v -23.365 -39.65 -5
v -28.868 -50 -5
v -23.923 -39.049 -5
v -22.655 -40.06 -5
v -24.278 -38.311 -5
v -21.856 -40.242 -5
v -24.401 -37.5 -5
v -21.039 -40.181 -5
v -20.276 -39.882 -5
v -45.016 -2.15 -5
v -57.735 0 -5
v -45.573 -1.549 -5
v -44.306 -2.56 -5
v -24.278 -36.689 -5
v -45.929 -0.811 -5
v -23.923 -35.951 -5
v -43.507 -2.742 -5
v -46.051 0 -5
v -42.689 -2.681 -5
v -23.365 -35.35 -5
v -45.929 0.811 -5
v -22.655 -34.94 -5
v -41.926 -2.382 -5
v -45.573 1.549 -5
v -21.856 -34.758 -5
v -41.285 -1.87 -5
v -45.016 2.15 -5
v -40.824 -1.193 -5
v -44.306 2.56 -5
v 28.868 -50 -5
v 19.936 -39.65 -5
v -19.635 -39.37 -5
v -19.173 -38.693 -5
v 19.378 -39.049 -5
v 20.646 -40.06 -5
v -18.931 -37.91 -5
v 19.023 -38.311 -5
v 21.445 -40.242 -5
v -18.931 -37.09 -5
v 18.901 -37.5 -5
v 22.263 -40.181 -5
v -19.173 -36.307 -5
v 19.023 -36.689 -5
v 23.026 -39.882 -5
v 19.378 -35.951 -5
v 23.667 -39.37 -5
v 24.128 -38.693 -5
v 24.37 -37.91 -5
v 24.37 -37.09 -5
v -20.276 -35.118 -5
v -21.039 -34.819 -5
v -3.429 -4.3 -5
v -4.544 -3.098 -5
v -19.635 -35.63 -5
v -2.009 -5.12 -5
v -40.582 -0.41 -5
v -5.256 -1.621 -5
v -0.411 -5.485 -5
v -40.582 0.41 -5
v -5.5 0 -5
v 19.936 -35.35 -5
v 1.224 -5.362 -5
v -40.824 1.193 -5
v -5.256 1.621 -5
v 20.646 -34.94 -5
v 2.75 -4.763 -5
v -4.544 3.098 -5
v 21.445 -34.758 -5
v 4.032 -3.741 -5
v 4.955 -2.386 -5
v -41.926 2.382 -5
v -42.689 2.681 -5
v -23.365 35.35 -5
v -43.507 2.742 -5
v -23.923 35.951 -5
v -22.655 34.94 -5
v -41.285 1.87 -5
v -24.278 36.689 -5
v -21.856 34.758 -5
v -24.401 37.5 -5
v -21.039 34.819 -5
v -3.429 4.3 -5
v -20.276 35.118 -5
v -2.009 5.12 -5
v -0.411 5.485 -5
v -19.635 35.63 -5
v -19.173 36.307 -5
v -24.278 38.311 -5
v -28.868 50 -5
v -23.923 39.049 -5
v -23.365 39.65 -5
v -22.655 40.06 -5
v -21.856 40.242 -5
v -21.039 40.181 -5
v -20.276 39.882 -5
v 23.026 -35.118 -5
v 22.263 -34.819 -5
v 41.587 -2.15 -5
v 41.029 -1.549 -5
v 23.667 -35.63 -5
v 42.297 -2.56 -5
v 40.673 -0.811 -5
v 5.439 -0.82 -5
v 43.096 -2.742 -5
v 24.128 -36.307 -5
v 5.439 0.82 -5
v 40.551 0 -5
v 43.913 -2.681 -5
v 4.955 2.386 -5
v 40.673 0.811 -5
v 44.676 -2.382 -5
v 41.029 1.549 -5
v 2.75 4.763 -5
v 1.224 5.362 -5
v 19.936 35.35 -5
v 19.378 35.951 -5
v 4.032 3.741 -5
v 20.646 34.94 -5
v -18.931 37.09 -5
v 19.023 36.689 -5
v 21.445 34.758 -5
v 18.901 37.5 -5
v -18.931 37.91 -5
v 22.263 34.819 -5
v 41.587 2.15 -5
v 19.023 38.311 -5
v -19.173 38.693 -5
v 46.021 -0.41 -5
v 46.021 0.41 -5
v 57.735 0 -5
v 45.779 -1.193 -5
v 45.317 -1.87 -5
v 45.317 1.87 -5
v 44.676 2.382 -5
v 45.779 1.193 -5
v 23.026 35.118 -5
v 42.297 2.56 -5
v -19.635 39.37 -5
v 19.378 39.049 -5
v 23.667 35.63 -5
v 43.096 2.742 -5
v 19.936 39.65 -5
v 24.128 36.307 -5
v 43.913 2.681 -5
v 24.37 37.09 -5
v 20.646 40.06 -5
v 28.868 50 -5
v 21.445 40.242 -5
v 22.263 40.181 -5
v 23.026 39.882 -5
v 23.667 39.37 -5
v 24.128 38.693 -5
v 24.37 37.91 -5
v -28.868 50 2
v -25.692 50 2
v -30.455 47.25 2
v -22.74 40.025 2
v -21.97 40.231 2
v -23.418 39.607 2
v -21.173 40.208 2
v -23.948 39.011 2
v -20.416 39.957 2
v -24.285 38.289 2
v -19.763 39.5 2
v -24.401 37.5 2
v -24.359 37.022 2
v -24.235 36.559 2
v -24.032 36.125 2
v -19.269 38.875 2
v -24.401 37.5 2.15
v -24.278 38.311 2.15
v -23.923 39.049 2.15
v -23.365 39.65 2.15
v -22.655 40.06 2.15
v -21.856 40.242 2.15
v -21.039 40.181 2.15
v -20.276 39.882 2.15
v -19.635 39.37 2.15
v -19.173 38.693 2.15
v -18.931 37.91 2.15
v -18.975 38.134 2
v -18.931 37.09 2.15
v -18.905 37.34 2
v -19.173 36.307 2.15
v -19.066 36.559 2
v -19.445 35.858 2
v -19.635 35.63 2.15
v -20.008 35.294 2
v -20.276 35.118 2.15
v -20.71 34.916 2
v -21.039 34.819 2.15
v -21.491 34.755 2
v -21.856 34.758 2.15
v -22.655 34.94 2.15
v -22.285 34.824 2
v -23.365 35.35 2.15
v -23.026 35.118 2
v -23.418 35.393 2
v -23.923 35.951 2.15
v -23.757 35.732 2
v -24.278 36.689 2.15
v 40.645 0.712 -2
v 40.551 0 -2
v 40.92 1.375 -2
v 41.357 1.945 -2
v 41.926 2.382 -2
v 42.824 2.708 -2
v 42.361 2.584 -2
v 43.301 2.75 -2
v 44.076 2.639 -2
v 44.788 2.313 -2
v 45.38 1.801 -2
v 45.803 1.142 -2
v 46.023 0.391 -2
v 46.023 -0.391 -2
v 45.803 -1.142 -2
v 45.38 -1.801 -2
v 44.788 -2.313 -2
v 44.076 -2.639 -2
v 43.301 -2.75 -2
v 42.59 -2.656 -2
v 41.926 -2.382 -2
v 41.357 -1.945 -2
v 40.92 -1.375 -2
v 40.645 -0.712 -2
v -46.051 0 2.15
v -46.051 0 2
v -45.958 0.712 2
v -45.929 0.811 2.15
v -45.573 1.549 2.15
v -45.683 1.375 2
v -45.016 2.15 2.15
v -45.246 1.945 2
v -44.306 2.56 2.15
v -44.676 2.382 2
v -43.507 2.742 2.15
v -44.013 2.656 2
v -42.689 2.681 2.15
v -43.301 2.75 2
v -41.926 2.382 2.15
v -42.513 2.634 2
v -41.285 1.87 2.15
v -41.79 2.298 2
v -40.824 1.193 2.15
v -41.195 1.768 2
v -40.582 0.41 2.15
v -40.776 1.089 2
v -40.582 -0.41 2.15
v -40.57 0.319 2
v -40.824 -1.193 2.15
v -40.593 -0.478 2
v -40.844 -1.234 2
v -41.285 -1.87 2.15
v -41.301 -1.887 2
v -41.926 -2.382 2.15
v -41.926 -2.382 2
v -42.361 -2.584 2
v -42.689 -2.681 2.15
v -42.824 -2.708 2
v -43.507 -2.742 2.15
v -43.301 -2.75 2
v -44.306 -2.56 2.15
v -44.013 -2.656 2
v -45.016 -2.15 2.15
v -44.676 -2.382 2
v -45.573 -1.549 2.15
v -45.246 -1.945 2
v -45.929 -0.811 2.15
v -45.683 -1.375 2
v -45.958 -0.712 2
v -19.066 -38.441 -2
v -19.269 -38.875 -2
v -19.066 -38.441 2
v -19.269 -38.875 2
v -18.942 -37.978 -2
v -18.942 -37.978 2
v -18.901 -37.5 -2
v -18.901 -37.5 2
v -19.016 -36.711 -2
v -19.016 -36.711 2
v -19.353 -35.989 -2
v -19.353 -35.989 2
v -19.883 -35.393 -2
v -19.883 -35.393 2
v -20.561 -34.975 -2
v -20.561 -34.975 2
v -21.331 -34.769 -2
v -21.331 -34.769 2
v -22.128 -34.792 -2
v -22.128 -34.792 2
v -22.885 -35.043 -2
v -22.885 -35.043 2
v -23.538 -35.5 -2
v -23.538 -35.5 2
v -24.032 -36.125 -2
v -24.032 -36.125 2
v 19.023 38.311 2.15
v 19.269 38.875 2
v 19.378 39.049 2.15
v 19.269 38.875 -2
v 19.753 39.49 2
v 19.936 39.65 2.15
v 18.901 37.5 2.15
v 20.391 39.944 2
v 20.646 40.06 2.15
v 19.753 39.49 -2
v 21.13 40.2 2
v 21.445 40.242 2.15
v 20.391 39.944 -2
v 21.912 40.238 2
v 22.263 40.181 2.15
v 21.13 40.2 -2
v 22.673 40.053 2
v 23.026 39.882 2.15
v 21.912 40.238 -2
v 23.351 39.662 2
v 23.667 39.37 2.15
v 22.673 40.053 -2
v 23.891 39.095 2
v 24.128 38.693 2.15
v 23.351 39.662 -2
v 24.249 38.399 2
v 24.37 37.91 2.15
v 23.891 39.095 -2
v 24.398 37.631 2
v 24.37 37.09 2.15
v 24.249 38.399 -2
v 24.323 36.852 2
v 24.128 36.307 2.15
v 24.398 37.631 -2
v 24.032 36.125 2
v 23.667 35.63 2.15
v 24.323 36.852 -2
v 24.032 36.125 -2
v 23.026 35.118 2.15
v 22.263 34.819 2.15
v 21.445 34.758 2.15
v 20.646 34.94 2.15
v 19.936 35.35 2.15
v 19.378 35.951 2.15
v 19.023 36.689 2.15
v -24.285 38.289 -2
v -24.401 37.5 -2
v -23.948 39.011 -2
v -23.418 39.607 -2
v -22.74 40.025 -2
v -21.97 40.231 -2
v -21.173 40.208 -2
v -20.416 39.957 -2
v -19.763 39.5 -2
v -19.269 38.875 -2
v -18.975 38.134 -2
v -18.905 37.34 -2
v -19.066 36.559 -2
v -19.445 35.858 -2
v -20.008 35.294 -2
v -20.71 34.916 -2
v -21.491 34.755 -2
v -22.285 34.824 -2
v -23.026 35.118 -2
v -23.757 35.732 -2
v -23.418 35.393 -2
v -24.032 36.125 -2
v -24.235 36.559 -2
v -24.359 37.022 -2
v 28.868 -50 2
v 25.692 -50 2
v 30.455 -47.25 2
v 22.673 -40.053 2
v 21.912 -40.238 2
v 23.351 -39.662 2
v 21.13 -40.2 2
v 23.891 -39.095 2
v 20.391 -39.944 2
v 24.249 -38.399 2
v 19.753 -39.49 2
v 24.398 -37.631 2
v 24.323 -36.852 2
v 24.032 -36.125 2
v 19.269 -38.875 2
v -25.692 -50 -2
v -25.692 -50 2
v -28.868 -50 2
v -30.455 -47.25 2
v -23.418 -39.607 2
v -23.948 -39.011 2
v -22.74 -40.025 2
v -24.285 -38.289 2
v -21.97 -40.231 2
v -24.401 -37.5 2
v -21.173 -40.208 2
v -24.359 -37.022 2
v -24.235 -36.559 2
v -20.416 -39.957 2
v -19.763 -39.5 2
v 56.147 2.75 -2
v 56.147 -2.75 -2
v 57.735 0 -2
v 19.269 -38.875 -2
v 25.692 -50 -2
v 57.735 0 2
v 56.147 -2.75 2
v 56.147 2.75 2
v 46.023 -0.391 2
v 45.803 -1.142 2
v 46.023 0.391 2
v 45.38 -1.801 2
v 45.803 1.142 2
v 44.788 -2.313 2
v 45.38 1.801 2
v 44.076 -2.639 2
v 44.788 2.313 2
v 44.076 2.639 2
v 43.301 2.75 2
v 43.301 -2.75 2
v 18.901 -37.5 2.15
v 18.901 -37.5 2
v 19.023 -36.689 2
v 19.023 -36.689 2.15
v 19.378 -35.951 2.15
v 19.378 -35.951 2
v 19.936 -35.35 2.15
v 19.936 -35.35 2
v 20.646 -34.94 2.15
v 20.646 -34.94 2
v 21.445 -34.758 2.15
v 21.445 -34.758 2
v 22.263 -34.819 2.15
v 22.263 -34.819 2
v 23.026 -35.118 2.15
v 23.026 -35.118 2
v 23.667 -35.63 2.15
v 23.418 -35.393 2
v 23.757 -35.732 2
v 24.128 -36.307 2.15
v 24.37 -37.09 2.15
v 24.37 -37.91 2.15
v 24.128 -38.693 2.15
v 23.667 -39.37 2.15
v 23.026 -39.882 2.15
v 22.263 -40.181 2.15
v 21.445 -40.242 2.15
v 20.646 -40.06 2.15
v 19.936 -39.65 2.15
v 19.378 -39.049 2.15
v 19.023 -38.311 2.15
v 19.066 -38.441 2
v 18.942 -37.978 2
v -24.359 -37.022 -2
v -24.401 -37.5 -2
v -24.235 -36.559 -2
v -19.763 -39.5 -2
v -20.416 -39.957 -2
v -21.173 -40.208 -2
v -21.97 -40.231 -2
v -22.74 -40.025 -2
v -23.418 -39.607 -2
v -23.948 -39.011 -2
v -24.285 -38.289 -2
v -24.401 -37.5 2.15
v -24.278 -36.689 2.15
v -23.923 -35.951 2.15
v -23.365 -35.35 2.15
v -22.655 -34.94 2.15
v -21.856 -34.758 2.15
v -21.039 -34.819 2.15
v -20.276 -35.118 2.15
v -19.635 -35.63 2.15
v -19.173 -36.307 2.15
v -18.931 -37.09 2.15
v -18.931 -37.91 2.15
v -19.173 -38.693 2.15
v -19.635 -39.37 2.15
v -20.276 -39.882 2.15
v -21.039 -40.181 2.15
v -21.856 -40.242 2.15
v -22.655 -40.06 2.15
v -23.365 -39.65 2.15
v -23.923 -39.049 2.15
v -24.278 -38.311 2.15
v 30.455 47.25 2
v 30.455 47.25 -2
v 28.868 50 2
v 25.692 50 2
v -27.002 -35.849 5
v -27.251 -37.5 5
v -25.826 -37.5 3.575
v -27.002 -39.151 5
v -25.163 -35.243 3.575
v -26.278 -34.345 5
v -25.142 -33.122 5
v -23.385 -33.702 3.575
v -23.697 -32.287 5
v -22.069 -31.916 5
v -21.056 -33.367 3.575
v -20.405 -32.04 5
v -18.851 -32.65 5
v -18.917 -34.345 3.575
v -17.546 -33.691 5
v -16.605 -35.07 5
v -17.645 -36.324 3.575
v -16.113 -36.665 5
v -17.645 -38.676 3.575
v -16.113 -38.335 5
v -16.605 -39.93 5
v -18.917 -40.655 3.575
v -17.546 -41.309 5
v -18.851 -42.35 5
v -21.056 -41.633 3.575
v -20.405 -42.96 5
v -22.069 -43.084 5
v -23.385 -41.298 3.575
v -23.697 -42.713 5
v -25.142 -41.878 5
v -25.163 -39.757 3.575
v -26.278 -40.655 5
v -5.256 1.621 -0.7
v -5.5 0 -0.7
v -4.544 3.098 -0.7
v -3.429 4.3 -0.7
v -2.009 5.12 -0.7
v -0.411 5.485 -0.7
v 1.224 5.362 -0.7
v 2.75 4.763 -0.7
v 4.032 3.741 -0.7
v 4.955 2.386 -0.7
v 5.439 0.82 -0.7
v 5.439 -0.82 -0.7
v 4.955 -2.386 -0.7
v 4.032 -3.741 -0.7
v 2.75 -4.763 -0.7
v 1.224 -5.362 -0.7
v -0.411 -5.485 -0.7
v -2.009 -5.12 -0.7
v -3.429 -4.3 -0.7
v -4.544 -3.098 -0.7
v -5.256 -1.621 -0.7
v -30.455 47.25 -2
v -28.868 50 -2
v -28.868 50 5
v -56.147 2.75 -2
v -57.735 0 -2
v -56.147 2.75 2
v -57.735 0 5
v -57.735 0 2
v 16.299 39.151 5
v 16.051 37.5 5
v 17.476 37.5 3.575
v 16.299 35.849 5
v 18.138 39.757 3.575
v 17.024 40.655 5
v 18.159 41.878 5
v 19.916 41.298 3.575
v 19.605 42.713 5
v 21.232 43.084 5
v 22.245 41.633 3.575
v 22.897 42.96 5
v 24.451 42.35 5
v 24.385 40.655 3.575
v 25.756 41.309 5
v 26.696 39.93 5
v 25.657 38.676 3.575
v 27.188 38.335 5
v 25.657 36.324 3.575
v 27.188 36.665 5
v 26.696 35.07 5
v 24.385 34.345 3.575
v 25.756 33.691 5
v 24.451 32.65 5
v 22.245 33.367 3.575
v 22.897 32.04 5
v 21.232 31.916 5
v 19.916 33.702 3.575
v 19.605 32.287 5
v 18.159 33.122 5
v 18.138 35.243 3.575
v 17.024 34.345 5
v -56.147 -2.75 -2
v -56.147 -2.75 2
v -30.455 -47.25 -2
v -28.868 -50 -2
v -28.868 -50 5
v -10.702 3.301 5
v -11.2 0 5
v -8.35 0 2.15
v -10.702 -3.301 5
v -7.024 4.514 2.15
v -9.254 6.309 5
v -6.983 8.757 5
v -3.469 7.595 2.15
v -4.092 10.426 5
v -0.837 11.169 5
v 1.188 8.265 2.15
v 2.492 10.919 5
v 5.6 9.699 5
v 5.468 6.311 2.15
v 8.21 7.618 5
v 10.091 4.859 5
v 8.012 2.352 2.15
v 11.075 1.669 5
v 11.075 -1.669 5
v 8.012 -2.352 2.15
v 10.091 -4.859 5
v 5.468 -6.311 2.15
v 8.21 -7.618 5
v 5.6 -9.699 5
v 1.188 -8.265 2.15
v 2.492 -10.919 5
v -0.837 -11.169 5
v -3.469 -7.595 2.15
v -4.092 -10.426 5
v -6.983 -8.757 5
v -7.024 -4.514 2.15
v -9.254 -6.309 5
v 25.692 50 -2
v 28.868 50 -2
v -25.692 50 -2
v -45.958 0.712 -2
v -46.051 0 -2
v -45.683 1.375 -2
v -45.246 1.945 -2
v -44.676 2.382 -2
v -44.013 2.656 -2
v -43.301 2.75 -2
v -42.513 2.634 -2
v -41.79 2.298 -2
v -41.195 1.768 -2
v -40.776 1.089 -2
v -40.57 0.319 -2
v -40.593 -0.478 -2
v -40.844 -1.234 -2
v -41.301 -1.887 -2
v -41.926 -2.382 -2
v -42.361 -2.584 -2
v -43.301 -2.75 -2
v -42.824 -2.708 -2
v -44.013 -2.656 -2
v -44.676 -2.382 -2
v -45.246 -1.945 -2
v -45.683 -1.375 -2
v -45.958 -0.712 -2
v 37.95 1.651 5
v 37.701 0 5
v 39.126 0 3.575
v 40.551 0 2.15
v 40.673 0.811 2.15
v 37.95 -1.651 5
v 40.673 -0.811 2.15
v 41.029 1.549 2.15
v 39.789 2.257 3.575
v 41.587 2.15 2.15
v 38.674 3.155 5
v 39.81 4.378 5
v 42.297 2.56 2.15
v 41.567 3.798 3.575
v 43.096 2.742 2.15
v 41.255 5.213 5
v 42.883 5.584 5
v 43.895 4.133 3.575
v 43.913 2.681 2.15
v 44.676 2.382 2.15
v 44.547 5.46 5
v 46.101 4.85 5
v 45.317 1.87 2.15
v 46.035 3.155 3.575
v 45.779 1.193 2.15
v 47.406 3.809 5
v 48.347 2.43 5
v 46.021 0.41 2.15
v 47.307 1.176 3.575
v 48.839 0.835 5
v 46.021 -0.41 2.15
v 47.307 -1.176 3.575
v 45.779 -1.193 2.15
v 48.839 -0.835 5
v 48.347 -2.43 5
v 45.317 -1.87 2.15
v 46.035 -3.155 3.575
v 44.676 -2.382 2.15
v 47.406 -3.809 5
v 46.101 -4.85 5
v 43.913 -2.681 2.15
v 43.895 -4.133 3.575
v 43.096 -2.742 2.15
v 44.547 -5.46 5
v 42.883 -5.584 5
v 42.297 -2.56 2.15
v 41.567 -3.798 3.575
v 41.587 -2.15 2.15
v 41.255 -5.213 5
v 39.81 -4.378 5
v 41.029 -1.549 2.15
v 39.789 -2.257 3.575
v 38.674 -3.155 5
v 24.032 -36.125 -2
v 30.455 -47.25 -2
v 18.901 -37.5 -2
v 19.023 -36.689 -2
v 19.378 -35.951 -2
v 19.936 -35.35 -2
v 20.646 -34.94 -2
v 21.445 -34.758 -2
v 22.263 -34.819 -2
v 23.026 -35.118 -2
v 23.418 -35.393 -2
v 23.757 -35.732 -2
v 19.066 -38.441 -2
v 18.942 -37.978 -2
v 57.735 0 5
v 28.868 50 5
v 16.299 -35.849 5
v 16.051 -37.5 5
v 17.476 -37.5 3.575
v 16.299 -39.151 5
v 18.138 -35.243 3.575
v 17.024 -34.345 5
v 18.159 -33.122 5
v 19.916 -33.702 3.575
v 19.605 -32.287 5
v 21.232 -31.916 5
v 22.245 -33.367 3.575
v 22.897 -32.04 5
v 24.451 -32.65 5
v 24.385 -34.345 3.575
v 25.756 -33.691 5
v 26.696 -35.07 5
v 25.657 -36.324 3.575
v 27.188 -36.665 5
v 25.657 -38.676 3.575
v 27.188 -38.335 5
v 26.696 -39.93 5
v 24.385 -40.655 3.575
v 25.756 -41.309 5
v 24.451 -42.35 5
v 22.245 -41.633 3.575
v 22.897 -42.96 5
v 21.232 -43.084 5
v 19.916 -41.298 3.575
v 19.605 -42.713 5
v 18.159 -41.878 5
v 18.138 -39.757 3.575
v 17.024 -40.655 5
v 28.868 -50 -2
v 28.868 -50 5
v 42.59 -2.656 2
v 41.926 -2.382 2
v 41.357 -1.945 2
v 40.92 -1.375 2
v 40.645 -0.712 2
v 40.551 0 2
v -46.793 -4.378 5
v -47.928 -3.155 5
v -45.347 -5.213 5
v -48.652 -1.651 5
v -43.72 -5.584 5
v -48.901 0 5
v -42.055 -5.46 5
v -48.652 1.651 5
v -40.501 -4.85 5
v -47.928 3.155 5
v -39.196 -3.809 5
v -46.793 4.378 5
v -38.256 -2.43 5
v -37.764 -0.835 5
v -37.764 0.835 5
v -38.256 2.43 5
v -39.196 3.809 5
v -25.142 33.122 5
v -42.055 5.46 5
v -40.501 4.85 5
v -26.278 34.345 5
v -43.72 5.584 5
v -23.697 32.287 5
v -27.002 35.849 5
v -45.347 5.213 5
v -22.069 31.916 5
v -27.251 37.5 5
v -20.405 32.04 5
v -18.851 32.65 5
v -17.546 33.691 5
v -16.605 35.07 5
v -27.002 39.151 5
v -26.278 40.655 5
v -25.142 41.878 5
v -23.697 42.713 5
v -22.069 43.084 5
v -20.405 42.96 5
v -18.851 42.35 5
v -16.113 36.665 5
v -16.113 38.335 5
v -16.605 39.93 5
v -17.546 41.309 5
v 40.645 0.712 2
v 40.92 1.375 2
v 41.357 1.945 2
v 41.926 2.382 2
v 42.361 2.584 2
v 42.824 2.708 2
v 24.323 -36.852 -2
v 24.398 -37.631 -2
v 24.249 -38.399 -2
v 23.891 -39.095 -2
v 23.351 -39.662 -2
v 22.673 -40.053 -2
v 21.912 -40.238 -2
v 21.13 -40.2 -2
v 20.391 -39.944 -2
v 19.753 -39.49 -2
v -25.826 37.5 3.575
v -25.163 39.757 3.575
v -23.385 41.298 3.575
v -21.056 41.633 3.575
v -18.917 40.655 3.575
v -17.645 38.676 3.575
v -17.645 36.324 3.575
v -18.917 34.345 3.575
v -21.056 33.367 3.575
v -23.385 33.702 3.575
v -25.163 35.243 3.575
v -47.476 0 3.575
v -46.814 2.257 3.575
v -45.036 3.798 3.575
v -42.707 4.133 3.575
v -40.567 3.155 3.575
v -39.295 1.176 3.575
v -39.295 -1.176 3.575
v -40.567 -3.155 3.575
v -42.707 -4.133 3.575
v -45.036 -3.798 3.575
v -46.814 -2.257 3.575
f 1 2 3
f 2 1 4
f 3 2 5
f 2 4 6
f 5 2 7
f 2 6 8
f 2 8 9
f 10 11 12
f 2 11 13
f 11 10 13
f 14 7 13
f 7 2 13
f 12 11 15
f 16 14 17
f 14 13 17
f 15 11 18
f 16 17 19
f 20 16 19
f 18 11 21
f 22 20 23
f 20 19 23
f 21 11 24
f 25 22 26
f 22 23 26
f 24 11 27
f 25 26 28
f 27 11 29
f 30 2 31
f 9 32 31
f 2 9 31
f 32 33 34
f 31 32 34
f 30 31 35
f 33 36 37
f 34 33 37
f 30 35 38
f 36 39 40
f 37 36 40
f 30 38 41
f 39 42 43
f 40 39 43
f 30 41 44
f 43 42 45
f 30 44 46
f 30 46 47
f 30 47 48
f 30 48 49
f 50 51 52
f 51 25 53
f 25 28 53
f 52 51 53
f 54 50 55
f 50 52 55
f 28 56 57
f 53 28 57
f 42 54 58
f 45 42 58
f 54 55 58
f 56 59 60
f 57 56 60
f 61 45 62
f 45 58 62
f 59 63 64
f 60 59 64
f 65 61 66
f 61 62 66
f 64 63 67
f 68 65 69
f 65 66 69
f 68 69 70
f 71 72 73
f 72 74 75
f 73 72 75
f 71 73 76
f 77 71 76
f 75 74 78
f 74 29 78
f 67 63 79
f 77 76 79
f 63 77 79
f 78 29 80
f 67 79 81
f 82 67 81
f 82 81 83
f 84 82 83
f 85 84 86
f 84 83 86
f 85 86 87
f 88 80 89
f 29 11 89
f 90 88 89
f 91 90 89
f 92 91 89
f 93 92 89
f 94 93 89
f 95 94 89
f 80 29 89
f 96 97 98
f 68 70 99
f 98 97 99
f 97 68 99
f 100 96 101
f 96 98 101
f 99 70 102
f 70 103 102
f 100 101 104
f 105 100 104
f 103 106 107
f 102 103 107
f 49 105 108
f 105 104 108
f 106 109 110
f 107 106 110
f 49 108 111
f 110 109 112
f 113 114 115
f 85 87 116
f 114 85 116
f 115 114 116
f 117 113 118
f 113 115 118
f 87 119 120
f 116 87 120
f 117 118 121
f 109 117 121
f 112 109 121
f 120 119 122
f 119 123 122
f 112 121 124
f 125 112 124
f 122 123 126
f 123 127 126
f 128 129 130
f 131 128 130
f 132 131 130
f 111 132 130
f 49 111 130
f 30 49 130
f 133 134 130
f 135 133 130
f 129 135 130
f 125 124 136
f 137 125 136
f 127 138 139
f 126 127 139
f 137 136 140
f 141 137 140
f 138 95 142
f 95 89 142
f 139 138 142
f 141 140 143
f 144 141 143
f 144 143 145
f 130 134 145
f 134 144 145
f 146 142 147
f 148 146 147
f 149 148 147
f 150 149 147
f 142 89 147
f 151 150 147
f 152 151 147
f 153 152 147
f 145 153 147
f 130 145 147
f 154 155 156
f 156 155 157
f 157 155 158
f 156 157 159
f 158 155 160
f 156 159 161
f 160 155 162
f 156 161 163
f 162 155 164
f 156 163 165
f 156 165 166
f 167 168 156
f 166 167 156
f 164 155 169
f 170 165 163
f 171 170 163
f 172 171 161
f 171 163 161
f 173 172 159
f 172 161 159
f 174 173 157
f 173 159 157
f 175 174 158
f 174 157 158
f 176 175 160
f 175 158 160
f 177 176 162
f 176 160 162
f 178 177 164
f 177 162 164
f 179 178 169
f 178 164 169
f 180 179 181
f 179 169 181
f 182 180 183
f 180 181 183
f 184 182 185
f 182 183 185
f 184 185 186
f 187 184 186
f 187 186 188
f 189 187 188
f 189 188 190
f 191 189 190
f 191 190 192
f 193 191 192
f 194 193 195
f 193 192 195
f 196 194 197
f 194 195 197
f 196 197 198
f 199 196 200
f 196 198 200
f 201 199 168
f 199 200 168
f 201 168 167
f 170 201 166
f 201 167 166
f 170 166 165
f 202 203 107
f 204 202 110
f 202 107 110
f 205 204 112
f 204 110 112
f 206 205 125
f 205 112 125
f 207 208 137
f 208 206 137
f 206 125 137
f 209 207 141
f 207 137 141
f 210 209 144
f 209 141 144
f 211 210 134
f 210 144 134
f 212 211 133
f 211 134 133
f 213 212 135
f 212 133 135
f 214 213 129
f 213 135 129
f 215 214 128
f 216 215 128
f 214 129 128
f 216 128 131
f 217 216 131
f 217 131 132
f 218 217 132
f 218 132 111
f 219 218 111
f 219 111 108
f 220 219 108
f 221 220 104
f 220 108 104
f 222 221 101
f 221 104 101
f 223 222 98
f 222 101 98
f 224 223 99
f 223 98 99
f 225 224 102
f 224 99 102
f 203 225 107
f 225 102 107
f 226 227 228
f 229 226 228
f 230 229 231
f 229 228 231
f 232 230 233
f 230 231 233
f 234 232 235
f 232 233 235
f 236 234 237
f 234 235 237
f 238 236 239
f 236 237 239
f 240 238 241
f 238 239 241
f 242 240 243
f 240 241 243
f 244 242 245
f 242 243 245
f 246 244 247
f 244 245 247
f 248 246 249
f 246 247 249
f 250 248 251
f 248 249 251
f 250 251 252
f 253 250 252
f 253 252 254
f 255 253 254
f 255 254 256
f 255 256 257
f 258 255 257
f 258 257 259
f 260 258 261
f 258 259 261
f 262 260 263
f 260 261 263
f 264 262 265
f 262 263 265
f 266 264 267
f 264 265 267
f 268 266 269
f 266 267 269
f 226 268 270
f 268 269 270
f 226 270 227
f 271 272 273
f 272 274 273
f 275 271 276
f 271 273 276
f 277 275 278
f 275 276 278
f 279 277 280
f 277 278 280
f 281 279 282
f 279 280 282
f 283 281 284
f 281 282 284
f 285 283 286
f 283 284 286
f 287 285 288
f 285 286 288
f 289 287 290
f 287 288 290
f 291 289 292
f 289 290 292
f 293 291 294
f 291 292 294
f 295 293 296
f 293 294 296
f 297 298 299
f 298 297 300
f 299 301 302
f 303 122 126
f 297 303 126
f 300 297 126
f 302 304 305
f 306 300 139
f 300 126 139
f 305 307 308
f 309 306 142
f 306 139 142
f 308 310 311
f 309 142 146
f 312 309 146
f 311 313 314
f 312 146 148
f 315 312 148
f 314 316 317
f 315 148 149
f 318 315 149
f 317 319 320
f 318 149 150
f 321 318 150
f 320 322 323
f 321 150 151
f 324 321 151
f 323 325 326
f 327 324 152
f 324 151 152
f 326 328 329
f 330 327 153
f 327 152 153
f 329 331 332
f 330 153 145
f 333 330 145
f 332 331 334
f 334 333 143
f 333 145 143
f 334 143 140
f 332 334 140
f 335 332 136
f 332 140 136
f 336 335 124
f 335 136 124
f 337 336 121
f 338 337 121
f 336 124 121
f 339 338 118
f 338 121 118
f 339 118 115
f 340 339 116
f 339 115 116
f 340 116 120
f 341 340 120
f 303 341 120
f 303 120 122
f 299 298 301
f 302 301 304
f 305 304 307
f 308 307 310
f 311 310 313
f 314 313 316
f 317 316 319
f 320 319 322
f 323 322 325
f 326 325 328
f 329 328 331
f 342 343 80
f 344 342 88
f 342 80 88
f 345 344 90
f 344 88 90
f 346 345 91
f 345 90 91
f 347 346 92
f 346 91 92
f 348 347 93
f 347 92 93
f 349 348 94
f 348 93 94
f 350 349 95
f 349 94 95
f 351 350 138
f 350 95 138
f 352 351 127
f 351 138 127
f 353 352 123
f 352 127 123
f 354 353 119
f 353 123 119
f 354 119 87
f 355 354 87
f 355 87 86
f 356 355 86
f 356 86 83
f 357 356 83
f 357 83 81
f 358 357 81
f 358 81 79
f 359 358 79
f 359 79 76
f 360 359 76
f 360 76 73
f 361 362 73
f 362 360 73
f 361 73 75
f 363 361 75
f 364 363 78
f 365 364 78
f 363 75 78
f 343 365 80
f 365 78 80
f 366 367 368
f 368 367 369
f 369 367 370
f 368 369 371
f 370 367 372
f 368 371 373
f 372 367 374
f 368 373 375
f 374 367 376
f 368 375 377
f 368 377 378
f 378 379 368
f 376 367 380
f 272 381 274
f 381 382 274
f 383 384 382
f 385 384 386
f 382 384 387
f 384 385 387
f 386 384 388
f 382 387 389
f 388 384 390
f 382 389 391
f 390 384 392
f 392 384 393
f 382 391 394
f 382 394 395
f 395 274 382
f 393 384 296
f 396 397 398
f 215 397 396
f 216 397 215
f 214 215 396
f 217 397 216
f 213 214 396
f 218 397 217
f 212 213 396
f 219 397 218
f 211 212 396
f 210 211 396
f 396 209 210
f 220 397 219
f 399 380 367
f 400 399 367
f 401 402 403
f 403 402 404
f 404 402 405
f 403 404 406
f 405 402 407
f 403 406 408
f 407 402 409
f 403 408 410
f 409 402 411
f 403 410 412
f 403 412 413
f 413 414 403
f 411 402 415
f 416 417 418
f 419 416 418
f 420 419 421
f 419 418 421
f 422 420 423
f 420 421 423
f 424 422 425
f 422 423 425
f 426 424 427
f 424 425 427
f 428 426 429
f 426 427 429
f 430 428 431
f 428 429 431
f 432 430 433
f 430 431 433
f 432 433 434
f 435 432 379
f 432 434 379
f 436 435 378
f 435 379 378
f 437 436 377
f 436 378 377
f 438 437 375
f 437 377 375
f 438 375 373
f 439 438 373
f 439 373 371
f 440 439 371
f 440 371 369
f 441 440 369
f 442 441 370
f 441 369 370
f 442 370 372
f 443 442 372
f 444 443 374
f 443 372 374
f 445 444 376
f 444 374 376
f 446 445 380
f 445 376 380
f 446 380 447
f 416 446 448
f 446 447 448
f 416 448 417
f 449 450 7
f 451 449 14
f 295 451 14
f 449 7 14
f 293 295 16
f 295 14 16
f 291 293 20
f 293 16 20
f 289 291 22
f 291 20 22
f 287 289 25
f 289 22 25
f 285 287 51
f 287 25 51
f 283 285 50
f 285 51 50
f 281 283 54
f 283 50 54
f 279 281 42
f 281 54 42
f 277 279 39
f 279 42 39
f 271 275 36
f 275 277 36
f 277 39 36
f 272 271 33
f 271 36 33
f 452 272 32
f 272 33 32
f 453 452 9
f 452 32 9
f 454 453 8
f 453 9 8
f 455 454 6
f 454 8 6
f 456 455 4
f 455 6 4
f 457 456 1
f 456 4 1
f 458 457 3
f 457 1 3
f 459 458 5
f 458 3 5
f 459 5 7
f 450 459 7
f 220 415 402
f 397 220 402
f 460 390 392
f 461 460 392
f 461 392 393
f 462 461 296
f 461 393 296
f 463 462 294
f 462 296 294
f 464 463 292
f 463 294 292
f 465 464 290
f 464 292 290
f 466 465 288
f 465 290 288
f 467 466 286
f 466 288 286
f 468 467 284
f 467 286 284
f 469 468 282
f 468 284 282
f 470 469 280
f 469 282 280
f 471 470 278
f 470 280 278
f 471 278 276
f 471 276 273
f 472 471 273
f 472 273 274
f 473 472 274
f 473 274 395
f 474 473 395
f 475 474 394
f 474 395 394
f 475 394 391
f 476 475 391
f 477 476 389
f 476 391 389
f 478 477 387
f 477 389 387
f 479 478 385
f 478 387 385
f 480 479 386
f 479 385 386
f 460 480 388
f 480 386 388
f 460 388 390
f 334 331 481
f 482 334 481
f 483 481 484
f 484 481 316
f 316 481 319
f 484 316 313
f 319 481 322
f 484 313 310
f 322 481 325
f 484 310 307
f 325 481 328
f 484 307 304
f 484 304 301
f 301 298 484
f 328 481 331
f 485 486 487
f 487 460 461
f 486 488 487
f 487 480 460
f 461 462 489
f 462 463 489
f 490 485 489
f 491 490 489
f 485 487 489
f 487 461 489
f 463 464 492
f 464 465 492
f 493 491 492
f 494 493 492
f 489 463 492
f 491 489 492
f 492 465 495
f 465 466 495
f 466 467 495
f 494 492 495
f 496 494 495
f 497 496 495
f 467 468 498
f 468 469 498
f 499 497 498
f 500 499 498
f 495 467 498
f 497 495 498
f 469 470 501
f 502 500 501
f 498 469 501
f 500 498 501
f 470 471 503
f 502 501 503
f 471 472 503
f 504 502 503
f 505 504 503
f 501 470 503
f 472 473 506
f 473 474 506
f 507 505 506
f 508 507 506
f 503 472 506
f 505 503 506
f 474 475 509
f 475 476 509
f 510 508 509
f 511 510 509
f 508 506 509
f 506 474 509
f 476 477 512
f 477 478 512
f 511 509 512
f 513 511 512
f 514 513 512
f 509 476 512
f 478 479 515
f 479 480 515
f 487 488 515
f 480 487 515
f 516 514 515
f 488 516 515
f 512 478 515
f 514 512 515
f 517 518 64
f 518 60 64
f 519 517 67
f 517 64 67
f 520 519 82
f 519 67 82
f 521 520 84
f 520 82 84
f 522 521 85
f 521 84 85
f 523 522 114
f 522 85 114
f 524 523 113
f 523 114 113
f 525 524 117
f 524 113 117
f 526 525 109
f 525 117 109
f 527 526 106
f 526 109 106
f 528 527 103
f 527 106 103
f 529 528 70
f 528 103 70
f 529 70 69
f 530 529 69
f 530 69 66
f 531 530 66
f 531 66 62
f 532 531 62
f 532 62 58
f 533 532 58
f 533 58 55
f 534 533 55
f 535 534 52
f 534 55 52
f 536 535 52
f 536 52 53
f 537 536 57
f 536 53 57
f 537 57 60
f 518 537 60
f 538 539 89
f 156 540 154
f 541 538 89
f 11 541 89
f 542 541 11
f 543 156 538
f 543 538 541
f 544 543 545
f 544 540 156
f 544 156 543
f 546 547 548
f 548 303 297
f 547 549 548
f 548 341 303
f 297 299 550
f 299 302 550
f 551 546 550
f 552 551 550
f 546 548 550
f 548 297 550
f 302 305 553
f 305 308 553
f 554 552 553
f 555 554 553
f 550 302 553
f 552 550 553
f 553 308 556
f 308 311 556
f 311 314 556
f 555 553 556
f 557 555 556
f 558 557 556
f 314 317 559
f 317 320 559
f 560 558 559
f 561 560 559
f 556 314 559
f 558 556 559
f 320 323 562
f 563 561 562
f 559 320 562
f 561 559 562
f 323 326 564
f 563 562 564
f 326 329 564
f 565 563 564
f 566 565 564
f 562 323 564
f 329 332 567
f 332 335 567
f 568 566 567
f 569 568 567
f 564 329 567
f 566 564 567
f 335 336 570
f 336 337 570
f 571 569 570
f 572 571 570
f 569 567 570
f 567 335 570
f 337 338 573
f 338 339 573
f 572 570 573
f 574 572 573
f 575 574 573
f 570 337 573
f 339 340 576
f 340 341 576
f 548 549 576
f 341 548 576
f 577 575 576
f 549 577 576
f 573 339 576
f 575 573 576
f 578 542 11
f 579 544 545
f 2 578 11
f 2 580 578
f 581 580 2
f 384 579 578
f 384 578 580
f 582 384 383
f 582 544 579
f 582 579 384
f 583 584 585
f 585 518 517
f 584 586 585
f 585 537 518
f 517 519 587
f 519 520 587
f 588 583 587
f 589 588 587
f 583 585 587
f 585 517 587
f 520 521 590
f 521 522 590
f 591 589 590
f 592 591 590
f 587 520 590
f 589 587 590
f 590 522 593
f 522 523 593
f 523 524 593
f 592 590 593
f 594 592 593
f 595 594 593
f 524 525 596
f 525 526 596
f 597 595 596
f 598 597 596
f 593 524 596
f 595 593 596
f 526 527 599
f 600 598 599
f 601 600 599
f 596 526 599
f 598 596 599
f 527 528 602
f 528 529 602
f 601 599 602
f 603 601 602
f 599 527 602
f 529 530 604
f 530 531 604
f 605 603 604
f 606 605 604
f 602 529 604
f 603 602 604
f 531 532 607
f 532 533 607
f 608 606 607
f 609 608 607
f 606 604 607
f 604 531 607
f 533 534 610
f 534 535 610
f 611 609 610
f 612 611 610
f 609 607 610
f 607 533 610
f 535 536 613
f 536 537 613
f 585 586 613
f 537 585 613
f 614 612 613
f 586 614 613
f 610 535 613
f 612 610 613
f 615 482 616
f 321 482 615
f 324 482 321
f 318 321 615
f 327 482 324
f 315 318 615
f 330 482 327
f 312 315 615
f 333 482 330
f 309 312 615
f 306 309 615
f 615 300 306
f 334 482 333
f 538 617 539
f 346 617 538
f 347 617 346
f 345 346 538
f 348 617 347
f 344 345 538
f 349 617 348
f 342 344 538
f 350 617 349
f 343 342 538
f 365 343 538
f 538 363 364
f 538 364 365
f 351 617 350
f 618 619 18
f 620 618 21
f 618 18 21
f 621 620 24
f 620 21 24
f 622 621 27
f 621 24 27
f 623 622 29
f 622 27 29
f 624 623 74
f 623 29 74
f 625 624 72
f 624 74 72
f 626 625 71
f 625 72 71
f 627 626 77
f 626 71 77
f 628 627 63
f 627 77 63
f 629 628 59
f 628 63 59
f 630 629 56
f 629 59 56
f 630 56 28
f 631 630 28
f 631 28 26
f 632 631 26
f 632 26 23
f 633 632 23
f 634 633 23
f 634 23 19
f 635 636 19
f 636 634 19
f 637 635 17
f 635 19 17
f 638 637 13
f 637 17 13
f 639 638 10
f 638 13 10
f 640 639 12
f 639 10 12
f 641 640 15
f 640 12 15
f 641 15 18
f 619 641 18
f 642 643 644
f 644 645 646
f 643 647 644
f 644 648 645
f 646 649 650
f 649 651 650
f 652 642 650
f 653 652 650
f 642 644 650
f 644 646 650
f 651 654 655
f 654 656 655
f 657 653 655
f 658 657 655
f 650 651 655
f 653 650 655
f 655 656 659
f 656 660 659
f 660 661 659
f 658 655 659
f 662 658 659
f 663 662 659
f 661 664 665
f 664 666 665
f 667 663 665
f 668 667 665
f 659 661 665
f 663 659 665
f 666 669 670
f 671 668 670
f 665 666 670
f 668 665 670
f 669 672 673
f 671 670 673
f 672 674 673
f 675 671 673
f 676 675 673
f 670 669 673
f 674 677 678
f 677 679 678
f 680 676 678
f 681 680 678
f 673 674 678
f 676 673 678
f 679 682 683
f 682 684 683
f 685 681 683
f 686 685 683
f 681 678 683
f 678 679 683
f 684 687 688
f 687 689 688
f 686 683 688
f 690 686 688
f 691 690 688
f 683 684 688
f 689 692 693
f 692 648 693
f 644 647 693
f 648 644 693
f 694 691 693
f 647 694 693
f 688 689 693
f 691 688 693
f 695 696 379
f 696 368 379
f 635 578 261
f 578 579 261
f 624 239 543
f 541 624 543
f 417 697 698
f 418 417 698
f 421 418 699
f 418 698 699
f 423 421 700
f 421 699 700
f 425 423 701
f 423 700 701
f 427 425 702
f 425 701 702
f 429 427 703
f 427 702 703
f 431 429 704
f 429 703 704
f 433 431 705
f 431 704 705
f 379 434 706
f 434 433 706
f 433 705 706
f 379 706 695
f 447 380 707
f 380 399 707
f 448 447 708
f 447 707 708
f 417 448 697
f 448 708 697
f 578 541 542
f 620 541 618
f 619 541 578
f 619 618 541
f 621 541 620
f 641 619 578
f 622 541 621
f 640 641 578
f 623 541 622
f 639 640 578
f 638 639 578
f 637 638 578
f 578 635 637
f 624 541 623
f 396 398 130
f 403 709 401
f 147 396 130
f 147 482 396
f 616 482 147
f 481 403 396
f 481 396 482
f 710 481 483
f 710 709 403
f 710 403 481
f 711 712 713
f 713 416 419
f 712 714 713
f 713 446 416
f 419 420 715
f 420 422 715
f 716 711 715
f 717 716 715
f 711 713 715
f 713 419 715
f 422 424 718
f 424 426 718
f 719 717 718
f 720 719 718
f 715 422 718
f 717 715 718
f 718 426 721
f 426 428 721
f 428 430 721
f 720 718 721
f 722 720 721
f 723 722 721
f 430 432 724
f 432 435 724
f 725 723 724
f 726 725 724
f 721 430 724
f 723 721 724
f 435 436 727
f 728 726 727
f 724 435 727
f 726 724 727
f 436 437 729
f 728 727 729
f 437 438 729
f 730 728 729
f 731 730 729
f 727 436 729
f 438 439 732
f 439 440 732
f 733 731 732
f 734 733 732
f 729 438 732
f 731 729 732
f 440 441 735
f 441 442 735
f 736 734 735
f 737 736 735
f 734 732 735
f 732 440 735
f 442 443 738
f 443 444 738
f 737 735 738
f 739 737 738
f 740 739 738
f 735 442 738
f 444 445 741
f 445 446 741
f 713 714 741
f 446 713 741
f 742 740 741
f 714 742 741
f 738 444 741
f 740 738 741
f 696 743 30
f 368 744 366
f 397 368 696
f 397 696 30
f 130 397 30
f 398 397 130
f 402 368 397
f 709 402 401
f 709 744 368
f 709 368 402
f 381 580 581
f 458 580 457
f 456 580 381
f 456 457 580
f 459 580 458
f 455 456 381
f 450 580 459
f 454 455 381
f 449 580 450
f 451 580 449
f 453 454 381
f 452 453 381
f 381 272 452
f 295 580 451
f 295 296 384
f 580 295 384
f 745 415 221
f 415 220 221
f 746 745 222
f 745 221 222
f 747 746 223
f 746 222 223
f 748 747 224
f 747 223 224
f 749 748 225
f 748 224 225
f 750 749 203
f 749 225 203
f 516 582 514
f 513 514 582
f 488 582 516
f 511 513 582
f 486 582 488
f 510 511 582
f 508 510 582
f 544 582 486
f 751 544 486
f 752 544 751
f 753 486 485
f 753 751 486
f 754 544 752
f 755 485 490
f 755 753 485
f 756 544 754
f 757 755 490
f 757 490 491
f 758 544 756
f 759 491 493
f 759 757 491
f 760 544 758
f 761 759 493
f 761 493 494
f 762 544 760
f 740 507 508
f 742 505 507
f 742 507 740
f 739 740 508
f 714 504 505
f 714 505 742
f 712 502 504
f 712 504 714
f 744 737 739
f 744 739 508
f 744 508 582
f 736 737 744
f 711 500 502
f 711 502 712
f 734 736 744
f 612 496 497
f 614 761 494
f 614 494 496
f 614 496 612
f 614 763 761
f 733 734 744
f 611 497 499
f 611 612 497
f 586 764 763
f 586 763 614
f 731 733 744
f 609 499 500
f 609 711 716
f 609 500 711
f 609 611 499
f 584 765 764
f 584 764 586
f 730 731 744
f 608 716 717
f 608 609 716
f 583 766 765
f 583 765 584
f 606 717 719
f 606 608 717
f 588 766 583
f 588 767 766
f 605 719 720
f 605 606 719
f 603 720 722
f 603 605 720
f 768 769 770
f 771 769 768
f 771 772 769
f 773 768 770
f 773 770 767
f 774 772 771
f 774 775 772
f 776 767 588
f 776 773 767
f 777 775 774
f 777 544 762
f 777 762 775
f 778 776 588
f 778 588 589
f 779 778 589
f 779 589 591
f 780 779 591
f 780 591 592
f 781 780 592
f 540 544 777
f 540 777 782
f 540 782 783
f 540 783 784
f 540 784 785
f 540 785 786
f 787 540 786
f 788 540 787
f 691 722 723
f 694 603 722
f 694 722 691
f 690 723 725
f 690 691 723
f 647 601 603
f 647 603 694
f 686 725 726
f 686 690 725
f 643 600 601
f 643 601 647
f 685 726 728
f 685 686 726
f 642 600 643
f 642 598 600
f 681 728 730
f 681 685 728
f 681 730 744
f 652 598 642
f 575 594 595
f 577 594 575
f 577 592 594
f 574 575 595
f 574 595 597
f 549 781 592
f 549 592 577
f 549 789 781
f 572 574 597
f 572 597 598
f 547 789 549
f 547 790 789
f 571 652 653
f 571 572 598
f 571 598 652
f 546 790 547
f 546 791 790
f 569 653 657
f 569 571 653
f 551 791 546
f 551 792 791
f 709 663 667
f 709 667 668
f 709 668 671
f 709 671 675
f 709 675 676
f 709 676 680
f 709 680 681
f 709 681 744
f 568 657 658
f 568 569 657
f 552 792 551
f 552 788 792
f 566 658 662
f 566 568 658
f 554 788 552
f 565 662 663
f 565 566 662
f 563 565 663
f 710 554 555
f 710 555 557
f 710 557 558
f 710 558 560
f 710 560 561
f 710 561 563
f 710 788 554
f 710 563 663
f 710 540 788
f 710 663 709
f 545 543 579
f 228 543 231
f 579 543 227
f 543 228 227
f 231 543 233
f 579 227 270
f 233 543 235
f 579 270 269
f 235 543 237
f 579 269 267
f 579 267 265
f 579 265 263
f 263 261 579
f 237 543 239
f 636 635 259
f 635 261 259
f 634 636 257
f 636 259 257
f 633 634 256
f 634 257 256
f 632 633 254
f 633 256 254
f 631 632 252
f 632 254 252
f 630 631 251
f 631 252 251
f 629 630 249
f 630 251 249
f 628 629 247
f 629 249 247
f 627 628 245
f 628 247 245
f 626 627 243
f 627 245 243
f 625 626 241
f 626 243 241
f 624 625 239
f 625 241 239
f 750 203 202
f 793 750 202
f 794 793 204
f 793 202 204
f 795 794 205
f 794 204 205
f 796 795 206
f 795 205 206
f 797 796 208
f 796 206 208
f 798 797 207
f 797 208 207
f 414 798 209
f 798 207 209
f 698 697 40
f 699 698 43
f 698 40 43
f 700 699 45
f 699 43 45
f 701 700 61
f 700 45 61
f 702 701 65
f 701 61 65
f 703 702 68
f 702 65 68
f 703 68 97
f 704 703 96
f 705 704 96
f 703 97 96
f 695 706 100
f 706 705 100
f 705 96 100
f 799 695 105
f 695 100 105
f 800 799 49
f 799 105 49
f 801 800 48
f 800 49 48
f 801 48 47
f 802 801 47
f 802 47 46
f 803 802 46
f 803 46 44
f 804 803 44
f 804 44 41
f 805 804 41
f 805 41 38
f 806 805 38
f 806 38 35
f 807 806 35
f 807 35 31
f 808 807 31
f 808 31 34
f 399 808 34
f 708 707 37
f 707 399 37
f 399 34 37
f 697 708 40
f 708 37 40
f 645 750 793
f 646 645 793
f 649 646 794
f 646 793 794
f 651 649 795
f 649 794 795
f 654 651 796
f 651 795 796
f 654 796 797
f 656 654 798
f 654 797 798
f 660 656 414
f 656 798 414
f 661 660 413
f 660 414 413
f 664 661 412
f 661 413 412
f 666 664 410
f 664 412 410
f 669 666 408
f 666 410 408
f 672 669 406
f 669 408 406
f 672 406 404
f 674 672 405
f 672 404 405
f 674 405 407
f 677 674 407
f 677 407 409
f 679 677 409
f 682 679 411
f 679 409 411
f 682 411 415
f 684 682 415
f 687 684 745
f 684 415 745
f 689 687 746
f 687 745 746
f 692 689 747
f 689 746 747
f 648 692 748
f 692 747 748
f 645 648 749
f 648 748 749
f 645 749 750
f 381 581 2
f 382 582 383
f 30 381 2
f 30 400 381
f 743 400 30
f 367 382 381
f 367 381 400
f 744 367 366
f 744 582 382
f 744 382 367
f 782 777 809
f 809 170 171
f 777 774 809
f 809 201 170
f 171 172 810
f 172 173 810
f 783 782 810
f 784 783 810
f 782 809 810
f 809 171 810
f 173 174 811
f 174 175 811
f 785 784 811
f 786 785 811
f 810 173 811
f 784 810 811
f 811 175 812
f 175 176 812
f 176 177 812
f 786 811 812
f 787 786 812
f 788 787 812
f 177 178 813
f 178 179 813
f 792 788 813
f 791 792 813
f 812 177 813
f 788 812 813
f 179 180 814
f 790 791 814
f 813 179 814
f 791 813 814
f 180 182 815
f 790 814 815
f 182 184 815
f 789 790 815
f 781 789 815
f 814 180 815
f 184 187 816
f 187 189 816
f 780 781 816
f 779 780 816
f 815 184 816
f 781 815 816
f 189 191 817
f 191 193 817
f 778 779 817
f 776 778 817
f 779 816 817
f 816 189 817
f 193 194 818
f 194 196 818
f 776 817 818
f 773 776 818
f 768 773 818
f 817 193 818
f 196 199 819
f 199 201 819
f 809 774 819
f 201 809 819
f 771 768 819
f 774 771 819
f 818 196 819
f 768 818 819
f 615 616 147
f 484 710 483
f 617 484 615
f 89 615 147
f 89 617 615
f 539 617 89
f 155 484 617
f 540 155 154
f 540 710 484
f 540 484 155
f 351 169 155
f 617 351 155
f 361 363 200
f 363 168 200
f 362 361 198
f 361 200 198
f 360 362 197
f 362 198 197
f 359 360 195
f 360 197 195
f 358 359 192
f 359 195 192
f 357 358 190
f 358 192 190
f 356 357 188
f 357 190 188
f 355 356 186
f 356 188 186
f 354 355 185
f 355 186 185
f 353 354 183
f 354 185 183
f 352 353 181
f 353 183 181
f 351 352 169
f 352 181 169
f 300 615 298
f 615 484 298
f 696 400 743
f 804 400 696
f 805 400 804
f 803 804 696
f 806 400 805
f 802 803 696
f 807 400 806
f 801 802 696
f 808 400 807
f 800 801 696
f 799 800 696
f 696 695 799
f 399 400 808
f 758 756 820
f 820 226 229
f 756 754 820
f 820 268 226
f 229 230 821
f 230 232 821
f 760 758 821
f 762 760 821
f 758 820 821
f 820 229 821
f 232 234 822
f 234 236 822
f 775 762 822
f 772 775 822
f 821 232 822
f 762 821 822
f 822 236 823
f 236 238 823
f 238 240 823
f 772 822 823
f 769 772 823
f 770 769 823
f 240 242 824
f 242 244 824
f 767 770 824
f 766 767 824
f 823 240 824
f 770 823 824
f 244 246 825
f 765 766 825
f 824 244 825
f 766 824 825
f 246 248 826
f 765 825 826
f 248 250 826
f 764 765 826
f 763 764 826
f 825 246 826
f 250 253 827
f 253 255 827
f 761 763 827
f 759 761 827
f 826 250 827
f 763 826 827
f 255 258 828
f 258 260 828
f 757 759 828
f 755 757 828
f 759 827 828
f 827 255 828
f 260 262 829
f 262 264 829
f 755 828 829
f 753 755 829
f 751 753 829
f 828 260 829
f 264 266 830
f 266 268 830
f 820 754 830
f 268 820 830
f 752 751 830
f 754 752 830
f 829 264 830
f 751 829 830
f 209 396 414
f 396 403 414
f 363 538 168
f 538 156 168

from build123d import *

# Parameters (mm, degrees)
F1_DEPTH        = 5
F4_D            = 11
F4_DEPTH        = 57.15
F4_CSINK_D      = 22.4
F4_CSINK_ANGLE  = 90
F4_TIP          = 3.3047334047
F5_D            = 5.5
F5_DEPTH        = 57.15
F5_CSINK_D      = 11.2
F5_CSINK_ANGLE  = 90
F5_TIP          = 1.6523667023
F7_DEPTH        = 2
F7_COPIES_COUNT = 6


# Not quite as in the source:
# - a pattern or mirror of a feature is missing from the dataset's text; its kind, count and spacing are read off the source's solid


with BuildPart() as f1:
    # F0 (on Top) → F1 (new body, symmetric)
    with BuildSketch(Plane.XY):
        Polygon((28.8675134595, 50), (-28.8675134595, 50), (-57.735026919, 0), (-28.8675134595, -50), (28.8675134595, -50), (57.735026919, 0), align=None)
    extrude(amount=F1_DEPTH, both=True)

    # F4
    with Locations(Plane.XY.offset(5)):
        with Locations((0, 0)):
            CounterSinkHole(F4_D / 2, F4_CSINK_D / 2, depth=F4_DEPTH, counter_sink_angle=F4_CSINK_ANGLE)
            with Locations((0, 0, -(F4_DEPTH + F4_TIP / 2))):  # 118° drill point
                Cone(0, F4_D / 2, F4_TIP, mode=Mode.SUBTRACT)

    # F5
    with Locations(Plane.XY.offset(5)):
        with Locations((21.6506350946, 37.5), (43.3012701892, 0), (21.6506350946, -37.5), (-21.6506350946, -37.5), (-43.3012701892, 0), (-21.6506350946, 37.5)):
            CounterSinkHole(F5_D / 2, F5_CSINK_D / 2, depth=F5_DEPTH, counter_sink_angle=F5_CSINK_ANGLE)
            with Locations((0, 0, -(F5_DEPTH + F5_TIP / 2))):  # 118° drill point
                Cone(0, F5_D / 2, F5_TIP, mode=Mode.SUBTRACT)

    # F6 (on Top) → F7 (cut, symmetric)
    with BuildSketch(Plane.XY):
        with BuildLine():
            ThreePointArc((-19.2690652342, -38.875), (-18.9943390723, -38.211752374), (-18.9006350946, -37.5))
            ThreePointArc((-18.9006350946, -37.5), (-20.9388827206, -34.8437039777), (-24.032204955, -36.125))
            ThreePointArc((-24.032204955, -36.125), (-23.0256350946, -39.8815698604), (-19.2690652342, -38.875))
        make_face()
        with BuildLine():
            ThreePointArc((-19.2690652342, -38.875), (-23.0256350946, -39.8815698604), (-24.032204955, -36.125))
            Line((-24.032204955, -36.125), (-30.4552266998, -47.25))
            Line((-30.4552266998, -47.25), (-28.8675134595, -50))
            Line((-28.8675134595, -50), (-25.6920869789, -50))
            Line((-25.6920869789, -50), (-19.2690652342, -38.875))
        make_face()
    f7 = extrude(amount=F7_DEPTH, both=True, mode=Mode.SUBTRACT)

    # F7_copies: F7 ×6 about axis
    f7_copies_axis = Axis((0, 0, 0), (0, 0, 1))
    for i in range(1, F7_COPIES_COUNT):
        add(f7.rotate(f7_copies_axis, i * 360 / F7_COPIES_COUNT), mode=Mode.SUBTRACT)


solid = f1.part
